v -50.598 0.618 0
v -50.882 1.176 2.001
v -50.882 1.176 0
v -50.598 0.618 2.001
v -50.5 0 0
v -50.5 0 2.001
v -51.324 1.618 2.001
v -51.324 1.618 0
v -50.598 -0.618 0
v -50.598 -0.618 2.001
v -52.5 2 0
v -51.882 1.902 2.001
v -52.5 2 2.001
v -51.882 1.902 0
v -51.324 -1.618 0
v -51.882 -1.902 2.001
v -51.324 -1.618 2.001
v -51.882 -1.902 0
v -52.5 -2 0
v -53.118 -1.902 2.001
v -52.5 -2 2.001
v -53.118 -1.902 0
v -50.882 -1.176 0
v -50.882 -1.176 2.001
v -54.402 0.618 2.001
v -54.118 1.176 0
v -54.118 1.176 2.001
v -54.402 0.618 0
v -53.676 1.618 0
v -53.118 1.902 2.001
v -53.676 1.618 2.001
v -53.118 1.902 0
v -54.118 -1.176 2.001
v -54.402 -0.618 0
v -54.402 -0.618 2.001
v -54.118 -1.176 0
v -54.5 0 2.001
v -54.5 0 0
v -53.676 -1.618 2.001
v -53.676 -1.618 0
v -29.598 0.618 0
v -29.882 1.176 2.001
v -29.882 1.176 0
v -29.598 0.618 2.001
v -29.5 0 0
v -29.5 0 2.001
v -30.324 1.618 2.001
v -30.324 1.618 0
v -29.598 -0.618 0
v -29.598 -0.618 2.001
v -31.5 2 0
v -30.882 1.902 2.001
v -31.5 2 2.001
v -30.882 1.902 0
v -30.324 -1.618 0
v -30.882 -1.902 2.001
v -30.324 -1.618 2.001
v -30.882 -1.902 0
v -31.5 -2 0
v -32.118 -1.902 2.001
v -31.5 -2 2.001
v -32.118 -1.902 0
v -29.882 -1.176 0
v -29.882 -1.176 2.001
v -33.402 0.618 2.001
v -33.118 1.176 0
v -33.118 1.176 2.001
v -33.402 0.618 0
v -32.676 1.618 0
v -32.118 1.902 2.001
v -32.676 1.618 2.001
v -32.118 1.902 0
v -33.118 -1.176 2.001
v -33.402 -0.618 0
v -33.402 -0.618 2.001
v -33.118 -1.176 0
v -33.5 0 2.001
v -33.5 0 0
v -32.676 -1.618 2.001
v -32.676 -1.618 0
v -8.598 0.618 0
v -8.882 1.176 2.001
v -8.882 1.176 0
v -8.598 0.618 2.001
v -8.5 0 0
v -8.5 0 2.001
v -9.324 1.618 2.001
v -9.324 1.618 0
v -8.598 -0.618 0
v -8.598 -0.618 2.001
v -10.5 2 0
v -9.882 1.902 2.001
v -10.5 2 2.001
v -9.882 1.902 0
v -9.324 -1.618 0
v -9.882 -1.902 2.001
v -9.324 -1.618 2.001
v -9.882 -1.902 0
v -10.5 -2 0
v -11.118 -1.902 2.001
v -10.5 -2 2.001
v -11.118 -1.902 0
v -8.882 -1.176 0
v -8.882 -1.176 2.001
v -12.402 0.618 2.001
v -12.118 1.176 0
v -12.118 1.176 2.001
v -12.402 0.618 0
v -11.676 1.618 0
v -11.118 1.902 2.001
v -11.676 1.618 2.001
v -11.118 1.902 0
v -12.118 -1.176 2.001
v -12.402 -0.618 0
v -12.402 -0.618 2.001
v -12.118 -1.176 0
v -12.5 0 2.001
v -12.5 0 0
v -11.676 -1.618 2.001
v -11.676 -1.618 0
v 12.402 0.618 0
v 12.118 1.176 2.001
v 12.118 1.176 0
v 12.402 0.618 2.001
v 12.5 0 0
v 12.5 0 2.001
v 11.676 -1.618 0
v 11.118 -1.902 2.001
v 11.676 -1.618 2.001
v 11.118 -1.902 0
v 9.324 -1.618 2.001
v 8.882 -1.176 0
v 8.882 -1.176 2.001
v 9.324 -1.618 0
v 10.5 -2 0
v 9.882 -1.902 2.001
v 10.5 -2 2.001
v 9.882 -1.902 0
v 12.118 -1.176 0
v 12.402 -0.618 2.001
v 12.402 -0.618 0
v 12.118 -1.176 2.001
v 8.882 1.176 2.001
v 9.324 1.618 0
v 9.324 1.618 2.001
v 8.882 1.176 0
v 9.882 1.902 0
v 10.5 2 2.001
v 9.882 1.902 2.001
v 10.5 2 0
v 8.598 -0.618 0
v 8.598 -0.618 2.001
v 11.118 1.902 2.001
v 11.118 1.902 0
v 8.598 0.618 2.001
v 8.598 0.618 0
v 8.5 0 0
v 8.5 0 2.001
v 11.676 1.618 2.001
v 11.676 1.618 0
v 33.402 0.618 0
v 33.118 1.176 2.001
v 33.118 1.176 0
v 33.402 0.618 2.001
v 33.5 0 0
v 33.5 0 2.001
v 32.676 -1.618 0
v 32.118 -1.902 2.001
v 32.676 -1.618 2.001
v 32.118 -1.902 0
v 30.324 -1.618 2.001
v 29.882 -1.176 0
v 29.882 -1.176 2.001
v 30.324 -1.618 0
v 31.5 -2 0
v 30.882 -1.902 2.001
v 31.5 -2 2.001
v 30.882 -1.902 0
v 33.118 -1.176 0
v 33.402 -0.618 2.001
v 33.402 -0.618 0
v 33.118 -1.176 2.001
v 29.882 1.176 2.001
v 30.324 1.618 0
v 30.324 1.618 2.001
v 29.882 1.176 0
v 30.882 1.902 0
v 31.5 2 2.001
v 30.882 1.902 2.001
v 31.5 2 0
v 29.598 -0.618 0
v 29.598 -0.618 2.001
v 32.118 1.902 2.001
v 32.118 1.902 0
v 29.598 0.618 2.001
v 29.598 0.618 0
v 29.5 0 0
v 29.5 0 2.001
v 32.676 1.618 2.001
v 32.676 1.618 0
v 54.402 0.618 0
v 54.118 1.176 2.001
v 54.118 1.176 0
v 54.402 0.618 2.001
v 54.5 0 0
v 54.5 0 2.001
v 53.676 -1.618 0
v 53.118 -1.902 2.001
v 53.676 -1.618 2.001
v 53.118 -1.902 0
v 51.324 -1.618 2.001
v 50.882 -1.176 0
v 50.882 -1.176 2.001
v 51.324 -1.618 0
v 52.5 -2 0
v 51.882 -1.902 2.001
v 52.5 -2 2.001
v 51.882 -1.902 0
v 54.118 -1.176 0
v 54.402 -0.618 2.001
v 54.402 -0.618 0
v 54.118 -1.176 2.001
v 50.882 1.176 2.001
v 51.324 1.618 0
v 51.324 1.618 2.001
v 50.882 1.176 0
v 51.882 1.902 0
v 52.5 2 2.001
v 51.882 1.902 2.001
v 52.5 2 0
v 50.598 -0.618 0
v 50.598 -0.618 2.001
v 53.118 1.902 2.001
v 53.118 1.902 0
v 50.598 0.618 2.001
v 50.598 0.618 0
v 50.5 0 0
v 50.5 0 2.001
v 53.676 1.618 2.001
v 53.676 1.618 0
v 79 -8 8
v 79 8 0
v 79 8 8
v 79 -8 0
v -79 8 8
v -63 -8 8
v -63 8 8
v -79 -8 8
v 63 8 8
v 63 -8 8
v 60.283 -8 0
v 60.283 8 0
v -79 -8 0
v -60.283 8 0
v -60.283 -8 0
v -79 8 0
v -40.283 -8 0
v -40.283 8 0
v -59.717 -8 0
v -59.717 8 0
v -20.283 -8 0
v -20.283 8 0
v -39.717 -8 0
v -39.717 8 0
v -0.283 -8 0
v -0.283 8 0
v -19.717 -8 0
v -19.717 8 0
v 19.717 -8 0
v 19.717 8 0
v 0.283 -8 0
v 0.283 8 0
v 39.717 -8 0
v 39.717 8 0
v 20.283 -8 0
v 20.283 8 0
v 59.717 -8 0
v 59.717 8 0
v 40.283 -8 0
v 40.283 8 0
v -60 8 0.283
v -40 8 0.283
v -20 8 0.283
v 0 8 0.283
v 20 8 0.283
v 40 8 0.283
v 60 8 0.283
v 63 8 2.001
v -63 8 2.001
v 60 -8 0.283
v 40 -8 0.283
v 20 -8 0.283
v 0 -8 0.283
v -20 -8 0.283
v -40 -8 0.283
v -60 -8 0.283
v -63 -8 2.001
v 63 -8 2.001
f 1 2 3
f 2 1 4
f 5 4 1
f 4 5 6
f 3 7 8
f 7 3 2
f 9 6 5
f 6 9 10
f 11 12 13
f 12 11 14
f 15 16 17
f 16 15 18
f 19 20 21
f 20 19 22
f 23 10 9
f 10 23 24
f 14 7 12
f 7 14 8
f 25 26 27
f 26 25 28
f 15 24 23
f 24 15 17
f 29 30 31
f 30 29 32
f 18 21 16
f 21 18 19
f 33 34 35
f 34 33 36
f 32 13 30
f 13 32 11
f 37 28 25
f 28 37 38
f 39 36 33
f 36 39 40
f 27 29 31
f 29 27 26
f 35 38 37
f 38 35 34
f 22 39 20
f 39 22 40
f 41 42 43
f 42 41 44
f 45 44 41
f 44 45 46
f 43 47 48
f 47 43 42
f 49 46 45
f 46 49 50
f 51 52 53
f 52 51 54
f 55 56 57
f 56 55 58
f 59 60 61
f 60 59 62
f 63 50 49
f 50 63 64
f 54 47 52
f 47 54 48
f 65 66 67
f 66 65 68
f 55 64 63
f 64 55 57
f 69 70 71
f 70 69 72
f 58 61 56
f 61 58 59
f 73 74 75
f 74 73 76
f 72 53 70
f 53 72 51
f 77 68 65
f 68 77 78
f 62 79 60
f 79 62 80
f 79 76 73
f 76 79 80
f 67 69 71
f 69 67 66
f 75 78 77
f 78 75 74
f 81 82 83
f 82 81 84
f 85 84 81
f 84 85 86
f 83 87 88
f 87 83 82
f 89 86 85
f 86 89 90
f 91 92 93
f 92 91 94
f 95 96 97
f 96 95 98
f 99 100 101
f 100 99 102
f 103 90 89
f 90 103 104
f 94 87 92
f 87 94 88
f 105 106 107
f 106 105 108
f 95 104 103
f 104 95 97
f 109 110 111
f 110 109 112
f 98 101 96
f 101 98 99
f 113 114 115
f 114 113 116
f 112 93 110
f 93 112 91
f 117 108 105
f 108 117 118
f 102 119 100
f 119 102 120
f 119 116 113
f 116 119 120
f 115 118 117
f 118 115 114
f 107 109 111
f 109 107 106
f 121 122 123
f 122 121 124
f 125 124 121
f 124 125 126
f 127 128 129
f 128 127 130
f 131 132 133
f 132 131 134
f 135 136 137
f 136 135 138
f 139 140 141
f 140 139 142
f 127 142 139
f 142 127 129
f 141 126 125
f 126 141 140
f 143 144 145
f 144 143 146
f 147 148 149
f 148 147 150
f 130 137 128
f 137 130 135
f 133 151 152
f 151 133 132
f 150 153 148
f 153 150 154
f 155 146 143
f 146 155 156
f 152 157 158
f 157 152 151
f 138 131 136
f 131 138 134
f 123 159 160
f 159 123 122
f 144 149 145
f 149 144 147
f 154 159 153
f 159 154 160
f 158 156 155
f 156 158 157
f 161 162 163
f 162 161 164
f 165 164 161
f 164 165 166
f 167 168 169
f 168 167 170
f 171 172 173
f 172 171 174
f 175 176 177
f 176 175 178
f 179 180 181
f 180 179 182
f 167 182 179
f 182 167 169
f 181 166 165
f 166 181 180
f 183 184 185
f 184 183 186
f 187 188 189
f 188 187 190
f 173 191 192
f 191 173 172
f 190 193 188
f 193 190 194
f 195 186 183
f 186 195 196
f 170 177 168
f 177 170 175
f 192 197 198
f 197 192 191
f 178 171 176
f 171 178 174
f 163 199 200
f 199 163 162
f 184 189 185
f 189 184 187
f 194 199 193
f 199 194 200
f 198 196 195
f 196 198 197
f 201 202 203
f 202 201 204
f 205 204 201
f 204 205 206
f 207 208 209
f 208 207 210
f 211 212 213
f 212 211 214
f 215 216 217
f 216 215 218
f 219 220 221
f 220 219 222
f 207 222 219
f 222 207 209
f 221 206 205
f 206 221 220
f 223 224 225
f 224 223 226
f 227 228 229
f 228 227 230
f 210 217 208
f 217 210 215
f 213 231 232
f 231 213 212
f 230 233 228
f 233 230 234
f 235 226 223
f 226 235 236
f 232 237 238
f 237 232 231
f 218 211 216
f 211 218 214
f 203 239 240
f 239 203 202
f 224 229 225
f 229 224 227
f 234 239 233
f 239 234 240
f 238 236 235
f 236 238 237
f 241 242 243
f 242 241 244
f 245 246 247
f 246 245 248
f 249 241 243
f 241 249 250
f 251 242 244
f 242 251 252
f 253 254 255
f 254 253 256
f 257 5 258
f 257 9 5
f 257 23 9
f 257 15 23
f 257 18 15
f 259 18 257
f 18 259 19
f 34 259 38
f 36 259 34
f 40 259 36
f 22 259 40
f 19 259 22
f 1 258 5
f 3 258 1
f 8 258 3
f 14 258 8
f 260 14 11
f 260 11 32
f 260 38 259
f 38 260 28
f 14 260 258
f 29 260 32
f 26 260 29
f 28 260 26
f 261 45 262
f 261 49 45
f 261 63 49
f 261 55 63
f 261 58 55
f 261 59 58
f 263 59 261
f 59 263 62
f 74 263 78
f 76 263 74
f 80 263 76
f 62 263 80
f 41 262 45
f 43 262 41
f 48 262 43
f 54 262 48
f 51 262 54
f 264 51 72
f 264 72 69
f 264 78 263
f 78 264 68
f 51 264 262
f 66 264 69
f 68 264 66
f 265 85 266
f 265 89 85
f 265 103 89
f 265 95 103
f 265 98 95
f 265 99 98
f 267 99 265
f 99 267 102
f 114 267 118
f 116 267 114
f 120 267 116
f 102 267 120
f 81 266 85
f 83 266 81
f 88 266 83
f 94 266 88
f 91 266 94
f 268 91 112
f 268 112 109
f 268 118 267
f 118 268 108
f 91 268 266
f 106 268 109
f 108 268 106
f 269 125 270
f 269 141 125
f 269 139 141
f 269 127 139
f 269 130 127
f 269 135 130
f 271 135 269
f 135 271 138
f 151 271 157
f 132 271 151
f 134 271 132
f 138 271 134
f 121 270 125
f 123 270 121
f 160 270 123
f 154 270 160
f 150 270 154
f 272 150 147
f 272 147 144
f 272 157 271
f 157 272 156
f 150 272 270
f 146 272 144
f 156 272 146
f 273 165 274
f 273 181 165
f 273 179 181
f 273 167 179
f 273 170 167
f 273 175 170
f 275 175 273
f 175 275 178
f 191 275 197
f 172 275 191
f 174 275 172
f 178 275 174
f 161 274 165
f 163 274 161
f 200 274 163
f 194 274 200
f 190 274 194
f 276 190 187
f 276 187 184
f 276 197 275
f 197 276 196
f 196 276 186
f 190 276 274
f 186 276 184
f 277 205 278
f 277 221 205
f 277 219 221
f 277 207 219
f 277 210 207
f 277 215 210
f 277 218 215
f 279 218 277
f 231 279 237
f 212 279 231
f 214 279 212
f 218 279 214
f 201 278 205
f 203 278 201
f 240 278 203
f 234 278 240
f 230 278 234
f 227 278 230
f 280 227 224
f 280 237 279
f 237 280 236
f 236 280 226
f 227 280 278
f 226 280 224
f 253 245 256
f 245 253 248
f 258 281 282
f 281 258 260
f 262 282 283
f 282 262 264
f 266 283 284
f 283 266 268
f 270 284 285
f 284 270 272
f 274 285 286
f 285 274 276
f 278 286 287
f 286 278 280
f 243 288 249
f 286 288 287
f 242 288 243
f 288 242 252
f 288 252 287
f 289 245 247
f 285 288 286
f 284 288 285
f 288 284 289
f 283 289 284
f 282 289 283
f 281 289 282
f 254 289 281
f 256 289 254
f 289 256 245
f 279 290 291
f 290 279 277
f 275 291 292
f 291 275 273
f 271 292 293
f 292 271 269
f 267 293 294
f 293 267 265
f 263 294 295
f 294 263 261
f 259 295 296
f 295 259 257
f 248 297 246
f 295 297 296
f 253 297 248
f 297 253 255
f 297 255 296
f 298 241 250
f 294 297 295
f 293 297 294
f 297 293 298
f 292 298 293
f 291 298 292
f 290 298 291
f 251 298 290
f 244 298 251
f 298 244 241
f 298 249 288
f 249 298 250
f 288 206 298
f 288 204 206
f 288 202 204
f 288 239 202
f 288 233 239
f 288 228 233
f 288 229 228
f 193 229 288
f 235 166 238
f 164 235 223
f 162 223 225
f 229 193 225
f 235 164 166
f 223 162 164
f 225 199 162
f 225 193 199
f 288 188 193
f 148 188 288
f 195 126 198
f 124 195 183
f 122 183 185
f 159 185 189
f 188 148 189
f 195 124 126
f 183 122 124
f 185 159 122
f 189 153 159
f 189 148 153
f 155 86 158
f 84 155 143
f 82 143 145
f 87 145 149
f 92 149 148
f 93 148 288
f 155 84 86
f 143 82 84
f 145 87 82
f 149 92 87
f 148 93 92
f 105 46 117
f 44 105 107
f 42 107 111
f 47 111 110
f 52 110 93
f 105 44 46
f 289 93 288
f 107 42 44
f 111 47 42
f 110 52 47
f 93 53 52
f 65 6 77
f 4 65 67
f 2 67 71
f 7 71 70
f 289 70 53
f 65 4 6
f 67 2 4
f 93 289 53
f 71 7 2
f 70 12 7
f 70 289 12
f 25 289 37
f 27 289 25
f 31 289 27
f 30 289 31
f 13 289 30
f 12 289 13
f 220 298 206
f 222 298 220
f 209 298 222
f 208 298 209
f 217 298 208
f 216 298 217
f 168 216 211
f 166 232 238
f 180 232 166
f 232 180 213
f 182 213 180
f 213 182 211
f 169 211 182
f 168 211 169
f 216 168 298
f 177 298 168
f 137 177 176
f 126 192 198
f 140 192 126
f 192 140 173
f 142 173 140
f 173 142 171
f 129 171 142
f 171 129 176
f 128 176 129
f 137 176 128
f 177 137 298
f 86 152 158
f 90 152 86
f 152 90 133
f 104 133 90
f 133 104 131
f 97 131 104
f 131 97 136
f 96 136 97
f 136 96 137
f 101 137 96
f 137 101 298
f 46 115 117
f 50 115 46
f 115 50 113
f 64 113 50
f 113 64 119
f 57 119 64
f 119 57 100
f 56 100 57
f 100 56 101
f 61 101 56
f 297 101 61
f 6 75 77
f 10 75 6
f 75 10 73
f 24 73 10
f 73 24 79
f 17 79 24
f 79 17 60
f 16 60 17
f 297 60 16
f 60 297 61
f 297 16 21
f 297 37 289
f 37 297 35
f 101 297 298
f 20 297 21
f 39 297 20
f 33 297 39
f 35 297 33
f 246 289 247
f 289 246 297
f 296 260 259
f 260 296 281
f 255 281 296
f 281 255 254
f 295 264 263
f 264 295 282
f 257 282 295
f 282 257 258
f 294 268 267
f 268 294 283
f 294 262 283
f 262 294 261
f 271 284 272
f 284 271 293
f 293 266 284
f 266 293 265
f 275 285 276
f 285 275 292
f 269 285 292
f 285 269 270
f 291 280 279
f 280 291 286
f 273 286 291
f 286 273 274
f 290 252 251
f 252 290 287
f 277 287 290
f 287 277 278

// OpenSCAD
$fn = 20; // match spool-rack.scad; without it the wire holes print as 7-sided polygons

spool_height = 20;
spool_gap = 1;
spool_inner_diameter = 25;
dowel_radius = spool_inner_diameter/2 -1;
post_width = 16;

spool_span = spool_height+spool_gap;
num_spools = 6;

epsilon = .001;

total_spools_length = spool_span * num_spools;
left_edge = -total_spools_length / 2 - post_width;
dowel_length = total_spools_length + 2 * post_width;



module wire_guide() {
    difference() {
    translate([0,0,4])
    difference() {
        cube([dowel_length, 16, 8], center=true);

        translate([0,0, 1+epsilon])
        cube([total_spools_length, 16+epsilon*2, 6], center=true);

        for (i=[0:5]) {
            translate([spool_span*(i-3)+spool_span/2,0,-5])
            cylinder(h=10, r=2);
        }

        
        
    }

    for (i=[0:10]) {
            translate([i*20-100,0,0])
            rotate([0,45,0])
            cube([.4, 100, .4], center=true);
        }
    }
}

wire_guide();
